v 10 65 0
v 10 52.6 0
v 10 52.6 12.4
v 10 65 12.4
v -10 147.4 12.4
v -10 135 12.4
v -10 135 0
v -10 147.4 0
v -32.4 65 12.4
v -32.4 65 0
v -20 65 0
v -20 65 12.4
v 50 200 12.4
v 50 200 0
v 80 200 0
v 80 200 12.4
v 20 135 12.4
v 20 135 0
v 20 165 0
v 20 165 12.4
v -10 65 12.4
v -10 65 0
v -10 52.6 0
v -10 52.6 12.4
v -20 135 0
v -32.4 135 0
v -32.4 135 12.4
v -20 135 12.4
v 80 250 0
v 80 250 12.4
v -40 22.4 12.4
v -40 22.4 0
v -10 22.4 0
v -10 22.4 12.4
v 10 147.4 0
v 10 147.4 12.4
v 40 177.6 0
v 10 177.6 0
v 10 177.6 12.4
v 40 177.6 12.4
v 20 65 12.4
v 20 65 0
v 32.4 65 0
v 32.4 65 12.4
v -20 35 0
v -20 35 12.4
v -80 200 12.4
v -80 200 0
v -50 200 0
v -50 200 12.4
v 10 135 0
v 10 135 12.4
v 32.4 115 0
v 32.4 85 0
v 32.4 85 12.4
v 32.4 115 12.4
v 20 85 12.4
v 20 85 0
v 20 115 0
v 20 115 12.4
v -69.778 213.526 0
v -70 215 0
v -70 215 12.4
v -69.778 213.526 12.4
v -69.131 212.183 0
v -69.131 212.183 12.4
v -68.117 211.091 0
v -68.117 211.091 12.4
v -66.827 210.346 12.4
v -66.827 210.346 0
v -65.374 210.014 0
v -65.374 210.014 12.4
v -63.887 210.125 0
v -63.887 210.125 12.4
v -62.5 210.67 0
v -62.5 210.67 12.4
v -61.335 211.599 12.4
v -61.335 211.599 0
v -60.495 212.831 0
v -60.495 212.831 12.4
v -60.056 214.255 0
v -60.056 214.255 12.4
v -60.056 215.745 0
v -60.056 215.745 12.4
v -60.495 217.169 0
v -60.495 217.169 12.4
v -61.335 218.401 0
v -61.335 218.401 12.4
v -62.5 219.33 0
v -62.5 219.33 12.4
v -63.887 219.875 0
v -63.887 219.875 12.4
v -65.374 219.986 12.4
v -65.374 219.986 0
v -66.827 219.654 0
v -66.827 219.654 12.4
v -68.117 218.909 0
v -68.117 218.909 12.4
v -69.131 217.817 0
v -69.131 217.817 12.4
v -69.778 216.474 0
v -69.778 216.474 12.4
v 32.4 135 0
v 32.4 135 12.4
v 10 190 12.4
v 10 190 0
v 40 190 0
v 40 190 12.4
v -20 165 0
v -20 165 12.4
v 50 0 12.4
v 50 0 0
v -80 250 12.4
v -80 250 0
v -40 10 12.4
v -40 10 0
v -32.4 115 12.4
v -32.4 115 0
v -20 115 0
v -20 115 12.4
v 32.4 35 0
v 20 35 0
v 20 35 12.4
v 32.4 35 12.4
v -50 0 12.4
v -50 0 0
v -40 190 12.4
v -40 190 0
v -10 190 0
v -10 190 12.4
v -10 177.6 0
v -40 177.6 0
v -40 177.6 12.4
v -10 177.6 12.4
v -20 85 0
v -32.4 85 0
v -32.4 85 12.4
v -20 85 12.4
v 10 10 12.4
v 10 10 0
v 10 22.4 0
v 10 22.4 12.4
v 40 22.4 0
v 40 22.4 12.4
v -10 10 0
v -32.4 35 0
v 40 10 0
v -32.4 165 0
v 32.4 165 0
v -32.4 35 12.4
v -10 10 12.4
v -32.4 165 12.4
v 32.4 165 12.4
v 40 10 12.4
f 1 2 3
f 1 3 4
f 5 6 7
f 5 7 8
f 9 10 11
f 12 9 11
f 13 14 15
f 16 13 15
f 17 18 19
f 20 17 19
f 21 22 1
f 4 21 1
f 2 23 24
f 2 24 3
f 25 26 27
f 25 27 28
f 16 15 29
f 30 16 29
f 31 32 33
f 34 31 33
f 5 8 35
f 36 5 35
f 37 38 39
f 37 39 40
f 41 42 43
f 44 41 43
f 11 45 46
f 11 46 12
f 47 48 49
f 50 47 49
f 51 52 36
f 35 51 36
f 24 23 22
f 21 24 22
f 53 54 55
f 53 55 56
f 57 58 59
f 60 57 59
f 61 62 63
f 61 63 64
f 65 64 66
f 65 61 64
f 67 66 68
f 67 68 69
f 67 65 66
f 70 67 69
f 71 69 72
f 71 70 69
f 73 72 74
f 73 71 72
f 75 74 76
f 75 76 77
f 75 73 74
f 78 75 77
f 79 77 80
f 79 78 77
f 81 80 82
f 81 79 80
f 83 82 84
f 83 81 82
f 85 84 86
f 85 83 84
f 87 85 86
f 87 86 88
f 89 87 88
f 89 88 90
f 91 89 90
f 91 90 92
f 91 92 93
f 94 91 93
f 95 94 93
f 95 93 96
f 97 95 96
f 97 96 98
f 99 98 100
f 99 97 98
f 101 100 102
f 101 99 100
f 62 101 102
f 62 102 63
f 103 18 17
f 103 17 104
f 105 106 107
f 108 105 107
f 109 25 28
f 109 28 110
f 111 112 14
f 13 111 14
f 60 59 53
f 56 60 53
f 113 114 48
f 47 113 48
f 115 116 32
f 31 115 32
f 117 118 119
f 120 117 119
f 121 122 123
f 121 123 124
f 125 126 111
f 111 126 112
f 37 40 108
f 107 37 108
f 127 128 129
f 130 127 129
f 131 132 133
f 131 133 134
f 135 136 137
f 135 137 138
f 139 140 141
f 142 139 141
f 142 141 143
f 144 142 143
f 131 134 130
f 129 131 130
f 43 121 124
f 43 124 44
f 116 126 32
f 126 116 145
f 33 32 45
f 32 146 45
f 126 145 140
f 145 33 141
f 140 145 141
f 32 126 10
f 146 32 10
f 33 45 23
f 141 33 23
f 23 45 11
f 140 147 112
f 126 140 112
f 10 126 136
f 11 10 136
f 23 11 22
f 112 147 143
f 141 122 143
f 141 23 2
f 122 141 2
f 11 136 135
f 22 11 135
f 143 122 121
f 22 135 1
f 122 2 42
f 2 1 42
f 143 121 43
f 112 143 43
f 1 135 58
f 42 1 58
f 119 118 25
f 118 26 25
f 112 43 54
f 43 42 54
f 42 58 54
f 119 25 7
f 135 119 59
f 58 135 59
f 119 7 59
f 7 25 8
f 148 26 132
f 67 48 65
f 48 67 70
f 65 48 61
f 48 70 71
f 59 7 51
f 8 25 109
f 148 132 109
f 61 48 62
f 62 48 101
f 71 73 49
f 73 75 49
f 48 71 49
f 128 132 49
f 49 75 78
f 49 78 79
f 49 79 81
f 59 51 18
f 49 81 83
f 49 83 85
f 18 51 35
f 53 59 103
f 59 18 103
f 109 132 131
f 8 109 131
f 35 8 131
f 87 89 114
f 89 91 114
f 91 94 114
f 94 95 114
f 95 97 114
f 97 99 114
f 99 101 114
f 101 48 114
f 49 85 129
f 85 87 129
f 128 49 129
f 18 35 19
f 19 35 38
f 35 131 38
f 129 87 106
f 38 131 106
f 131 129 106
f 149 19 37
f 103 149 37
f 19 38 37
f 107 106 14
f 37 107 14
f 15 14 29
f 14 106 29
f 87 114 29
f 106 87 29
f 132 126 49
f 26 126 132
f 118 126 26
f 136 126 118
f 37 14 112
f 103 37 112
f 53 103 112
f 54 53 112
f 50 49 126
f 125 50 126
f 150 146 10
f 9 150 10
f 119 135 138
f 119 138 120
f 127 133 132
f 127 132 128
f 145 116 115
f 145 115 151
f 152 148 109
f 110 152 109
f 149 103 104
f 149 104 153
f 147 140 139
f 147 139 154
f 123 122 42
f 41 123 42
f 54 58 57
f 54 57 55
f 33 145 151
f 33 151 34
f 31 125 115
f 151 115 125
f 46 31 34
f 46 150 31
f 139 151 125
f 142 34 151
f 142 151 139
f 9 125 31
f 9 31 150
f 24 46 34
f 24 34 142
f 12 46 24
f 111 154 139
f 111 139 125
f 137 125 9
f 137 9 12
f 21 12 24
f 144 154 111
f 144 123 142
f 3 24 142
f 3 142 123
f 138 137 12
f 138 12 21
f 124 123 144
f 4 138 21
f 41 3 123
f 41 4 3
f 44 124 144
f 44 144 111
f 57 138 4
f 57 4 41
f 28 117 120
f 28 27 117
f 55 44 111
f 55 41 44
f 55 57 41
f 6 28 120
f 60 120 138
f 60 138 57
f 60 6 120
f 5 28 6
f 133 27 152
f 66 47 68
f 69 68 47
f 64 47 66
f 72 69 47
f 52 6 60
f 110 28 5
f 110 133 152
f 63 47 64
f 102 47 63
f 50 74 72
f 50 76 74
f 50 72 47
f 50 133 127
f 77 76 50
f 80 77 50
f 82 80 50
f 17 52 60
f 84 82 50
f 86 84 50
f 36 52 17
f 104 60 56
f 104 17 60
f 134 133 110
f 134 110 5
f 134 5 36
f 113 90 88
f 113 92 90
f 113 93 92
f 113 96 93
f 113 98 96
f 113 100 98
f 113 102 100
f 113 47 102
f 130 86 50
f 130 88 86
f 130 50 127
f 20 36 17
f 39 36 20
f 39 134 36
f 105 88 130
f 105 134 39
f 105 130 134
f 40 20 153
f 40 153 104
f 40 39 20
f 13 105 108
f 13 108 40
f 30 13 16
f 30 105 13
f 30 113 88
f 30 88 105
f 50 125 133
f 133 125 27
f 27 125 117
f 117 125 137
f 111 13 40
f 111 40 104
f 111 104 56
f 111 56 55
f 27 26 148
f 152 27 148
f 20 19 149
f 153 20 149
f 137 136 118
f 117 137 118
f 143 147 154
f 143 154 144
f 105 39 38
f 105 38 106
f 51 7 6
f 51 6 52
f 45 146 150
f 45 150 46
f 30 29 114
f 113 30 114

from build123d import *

# Parameters (mm, degrees)
MODEL_R             = 5
MODEL_W             = 12.4
MODEL_H             = 30
MODEL_W_2           = 20
MODEL_H_2           = 12.4
MODEL_W_3           = 30
BOSS_EXTRUDE1_DEPTH = 12.4


with BuildPart() as part:
    # Model → Boss-Extrude1 (new body)
    with BuildSketch(Plane.XY):
        Polygon((50, 200), (80, 200), (80, 250), (-80, 250), (-80, 200), (-50, 200), (-50, 0), (50, 0), align=None)
        with Locations(Location((-65, 215, 0), (0, 0, 180))):
            Circle(MODEL_R, mode=Mode.SUBTRACT)
        with Locations((-26.2, 150)):
            Rectangle(MODEL_W, MODEL_H, mode=Mode.SUBTRACT)
        with Locations((-26.2, 100)):
            Rectangle(MODEL_W, MODEL_H, mode=Mode.SUBTRACT)
        with Locations((-26.2, 50)):
            Rectangle(MODEL_W, MODEL_H, mode=Mode.SUBTRACT)
        with Locations((26.2, 50)):
            Rectangle(MODEL_W, MODEL_H, mode=Mode.SUBTRACT)
        with Locations((26.2, 150)):
            Rectangle(MODEL_W, MODEL_H, mode=Mode.SUBTRACT)
        with Locations((26.2, 100)):
            Rectangle(MODEL_W, MODEL_H, mode=Mode.SUBTRACT)
        with Locations((0, 141.2)):
            Rectangle(MODEL_W_2, MODEL_H_2, mode=Mode.SUBTRACT)
        with Locations((0, 58.8)):
            Rectangle(MODEL_W_2, MODEL_H_2, mode=Mode.SUBTRACT)
        with Locations((25, 16.2)):
            Rectangle(MODEL_W_3, MODEL_H_2, mode=Mode.SUBTRACT)
        with Locations((-25, 16.2)):
            Rectangle(MODEL_W_3, MODEL_H_2, mode=Mode.SUBTRACT)
        with Locations((25, 183.8)):
            Rectangle(MODEL_W_3, MODEL_H_2, mode=Mode.SUBTRACT)
        with Locations((-25, 183.8)):
            Rectangle(MODEL_W_3, MODEL_H_2, mode=Mode.SUBTRACT)
    extrude(amount=BOSS_EXTRUDE1_DEPTH)


solid = part.part
